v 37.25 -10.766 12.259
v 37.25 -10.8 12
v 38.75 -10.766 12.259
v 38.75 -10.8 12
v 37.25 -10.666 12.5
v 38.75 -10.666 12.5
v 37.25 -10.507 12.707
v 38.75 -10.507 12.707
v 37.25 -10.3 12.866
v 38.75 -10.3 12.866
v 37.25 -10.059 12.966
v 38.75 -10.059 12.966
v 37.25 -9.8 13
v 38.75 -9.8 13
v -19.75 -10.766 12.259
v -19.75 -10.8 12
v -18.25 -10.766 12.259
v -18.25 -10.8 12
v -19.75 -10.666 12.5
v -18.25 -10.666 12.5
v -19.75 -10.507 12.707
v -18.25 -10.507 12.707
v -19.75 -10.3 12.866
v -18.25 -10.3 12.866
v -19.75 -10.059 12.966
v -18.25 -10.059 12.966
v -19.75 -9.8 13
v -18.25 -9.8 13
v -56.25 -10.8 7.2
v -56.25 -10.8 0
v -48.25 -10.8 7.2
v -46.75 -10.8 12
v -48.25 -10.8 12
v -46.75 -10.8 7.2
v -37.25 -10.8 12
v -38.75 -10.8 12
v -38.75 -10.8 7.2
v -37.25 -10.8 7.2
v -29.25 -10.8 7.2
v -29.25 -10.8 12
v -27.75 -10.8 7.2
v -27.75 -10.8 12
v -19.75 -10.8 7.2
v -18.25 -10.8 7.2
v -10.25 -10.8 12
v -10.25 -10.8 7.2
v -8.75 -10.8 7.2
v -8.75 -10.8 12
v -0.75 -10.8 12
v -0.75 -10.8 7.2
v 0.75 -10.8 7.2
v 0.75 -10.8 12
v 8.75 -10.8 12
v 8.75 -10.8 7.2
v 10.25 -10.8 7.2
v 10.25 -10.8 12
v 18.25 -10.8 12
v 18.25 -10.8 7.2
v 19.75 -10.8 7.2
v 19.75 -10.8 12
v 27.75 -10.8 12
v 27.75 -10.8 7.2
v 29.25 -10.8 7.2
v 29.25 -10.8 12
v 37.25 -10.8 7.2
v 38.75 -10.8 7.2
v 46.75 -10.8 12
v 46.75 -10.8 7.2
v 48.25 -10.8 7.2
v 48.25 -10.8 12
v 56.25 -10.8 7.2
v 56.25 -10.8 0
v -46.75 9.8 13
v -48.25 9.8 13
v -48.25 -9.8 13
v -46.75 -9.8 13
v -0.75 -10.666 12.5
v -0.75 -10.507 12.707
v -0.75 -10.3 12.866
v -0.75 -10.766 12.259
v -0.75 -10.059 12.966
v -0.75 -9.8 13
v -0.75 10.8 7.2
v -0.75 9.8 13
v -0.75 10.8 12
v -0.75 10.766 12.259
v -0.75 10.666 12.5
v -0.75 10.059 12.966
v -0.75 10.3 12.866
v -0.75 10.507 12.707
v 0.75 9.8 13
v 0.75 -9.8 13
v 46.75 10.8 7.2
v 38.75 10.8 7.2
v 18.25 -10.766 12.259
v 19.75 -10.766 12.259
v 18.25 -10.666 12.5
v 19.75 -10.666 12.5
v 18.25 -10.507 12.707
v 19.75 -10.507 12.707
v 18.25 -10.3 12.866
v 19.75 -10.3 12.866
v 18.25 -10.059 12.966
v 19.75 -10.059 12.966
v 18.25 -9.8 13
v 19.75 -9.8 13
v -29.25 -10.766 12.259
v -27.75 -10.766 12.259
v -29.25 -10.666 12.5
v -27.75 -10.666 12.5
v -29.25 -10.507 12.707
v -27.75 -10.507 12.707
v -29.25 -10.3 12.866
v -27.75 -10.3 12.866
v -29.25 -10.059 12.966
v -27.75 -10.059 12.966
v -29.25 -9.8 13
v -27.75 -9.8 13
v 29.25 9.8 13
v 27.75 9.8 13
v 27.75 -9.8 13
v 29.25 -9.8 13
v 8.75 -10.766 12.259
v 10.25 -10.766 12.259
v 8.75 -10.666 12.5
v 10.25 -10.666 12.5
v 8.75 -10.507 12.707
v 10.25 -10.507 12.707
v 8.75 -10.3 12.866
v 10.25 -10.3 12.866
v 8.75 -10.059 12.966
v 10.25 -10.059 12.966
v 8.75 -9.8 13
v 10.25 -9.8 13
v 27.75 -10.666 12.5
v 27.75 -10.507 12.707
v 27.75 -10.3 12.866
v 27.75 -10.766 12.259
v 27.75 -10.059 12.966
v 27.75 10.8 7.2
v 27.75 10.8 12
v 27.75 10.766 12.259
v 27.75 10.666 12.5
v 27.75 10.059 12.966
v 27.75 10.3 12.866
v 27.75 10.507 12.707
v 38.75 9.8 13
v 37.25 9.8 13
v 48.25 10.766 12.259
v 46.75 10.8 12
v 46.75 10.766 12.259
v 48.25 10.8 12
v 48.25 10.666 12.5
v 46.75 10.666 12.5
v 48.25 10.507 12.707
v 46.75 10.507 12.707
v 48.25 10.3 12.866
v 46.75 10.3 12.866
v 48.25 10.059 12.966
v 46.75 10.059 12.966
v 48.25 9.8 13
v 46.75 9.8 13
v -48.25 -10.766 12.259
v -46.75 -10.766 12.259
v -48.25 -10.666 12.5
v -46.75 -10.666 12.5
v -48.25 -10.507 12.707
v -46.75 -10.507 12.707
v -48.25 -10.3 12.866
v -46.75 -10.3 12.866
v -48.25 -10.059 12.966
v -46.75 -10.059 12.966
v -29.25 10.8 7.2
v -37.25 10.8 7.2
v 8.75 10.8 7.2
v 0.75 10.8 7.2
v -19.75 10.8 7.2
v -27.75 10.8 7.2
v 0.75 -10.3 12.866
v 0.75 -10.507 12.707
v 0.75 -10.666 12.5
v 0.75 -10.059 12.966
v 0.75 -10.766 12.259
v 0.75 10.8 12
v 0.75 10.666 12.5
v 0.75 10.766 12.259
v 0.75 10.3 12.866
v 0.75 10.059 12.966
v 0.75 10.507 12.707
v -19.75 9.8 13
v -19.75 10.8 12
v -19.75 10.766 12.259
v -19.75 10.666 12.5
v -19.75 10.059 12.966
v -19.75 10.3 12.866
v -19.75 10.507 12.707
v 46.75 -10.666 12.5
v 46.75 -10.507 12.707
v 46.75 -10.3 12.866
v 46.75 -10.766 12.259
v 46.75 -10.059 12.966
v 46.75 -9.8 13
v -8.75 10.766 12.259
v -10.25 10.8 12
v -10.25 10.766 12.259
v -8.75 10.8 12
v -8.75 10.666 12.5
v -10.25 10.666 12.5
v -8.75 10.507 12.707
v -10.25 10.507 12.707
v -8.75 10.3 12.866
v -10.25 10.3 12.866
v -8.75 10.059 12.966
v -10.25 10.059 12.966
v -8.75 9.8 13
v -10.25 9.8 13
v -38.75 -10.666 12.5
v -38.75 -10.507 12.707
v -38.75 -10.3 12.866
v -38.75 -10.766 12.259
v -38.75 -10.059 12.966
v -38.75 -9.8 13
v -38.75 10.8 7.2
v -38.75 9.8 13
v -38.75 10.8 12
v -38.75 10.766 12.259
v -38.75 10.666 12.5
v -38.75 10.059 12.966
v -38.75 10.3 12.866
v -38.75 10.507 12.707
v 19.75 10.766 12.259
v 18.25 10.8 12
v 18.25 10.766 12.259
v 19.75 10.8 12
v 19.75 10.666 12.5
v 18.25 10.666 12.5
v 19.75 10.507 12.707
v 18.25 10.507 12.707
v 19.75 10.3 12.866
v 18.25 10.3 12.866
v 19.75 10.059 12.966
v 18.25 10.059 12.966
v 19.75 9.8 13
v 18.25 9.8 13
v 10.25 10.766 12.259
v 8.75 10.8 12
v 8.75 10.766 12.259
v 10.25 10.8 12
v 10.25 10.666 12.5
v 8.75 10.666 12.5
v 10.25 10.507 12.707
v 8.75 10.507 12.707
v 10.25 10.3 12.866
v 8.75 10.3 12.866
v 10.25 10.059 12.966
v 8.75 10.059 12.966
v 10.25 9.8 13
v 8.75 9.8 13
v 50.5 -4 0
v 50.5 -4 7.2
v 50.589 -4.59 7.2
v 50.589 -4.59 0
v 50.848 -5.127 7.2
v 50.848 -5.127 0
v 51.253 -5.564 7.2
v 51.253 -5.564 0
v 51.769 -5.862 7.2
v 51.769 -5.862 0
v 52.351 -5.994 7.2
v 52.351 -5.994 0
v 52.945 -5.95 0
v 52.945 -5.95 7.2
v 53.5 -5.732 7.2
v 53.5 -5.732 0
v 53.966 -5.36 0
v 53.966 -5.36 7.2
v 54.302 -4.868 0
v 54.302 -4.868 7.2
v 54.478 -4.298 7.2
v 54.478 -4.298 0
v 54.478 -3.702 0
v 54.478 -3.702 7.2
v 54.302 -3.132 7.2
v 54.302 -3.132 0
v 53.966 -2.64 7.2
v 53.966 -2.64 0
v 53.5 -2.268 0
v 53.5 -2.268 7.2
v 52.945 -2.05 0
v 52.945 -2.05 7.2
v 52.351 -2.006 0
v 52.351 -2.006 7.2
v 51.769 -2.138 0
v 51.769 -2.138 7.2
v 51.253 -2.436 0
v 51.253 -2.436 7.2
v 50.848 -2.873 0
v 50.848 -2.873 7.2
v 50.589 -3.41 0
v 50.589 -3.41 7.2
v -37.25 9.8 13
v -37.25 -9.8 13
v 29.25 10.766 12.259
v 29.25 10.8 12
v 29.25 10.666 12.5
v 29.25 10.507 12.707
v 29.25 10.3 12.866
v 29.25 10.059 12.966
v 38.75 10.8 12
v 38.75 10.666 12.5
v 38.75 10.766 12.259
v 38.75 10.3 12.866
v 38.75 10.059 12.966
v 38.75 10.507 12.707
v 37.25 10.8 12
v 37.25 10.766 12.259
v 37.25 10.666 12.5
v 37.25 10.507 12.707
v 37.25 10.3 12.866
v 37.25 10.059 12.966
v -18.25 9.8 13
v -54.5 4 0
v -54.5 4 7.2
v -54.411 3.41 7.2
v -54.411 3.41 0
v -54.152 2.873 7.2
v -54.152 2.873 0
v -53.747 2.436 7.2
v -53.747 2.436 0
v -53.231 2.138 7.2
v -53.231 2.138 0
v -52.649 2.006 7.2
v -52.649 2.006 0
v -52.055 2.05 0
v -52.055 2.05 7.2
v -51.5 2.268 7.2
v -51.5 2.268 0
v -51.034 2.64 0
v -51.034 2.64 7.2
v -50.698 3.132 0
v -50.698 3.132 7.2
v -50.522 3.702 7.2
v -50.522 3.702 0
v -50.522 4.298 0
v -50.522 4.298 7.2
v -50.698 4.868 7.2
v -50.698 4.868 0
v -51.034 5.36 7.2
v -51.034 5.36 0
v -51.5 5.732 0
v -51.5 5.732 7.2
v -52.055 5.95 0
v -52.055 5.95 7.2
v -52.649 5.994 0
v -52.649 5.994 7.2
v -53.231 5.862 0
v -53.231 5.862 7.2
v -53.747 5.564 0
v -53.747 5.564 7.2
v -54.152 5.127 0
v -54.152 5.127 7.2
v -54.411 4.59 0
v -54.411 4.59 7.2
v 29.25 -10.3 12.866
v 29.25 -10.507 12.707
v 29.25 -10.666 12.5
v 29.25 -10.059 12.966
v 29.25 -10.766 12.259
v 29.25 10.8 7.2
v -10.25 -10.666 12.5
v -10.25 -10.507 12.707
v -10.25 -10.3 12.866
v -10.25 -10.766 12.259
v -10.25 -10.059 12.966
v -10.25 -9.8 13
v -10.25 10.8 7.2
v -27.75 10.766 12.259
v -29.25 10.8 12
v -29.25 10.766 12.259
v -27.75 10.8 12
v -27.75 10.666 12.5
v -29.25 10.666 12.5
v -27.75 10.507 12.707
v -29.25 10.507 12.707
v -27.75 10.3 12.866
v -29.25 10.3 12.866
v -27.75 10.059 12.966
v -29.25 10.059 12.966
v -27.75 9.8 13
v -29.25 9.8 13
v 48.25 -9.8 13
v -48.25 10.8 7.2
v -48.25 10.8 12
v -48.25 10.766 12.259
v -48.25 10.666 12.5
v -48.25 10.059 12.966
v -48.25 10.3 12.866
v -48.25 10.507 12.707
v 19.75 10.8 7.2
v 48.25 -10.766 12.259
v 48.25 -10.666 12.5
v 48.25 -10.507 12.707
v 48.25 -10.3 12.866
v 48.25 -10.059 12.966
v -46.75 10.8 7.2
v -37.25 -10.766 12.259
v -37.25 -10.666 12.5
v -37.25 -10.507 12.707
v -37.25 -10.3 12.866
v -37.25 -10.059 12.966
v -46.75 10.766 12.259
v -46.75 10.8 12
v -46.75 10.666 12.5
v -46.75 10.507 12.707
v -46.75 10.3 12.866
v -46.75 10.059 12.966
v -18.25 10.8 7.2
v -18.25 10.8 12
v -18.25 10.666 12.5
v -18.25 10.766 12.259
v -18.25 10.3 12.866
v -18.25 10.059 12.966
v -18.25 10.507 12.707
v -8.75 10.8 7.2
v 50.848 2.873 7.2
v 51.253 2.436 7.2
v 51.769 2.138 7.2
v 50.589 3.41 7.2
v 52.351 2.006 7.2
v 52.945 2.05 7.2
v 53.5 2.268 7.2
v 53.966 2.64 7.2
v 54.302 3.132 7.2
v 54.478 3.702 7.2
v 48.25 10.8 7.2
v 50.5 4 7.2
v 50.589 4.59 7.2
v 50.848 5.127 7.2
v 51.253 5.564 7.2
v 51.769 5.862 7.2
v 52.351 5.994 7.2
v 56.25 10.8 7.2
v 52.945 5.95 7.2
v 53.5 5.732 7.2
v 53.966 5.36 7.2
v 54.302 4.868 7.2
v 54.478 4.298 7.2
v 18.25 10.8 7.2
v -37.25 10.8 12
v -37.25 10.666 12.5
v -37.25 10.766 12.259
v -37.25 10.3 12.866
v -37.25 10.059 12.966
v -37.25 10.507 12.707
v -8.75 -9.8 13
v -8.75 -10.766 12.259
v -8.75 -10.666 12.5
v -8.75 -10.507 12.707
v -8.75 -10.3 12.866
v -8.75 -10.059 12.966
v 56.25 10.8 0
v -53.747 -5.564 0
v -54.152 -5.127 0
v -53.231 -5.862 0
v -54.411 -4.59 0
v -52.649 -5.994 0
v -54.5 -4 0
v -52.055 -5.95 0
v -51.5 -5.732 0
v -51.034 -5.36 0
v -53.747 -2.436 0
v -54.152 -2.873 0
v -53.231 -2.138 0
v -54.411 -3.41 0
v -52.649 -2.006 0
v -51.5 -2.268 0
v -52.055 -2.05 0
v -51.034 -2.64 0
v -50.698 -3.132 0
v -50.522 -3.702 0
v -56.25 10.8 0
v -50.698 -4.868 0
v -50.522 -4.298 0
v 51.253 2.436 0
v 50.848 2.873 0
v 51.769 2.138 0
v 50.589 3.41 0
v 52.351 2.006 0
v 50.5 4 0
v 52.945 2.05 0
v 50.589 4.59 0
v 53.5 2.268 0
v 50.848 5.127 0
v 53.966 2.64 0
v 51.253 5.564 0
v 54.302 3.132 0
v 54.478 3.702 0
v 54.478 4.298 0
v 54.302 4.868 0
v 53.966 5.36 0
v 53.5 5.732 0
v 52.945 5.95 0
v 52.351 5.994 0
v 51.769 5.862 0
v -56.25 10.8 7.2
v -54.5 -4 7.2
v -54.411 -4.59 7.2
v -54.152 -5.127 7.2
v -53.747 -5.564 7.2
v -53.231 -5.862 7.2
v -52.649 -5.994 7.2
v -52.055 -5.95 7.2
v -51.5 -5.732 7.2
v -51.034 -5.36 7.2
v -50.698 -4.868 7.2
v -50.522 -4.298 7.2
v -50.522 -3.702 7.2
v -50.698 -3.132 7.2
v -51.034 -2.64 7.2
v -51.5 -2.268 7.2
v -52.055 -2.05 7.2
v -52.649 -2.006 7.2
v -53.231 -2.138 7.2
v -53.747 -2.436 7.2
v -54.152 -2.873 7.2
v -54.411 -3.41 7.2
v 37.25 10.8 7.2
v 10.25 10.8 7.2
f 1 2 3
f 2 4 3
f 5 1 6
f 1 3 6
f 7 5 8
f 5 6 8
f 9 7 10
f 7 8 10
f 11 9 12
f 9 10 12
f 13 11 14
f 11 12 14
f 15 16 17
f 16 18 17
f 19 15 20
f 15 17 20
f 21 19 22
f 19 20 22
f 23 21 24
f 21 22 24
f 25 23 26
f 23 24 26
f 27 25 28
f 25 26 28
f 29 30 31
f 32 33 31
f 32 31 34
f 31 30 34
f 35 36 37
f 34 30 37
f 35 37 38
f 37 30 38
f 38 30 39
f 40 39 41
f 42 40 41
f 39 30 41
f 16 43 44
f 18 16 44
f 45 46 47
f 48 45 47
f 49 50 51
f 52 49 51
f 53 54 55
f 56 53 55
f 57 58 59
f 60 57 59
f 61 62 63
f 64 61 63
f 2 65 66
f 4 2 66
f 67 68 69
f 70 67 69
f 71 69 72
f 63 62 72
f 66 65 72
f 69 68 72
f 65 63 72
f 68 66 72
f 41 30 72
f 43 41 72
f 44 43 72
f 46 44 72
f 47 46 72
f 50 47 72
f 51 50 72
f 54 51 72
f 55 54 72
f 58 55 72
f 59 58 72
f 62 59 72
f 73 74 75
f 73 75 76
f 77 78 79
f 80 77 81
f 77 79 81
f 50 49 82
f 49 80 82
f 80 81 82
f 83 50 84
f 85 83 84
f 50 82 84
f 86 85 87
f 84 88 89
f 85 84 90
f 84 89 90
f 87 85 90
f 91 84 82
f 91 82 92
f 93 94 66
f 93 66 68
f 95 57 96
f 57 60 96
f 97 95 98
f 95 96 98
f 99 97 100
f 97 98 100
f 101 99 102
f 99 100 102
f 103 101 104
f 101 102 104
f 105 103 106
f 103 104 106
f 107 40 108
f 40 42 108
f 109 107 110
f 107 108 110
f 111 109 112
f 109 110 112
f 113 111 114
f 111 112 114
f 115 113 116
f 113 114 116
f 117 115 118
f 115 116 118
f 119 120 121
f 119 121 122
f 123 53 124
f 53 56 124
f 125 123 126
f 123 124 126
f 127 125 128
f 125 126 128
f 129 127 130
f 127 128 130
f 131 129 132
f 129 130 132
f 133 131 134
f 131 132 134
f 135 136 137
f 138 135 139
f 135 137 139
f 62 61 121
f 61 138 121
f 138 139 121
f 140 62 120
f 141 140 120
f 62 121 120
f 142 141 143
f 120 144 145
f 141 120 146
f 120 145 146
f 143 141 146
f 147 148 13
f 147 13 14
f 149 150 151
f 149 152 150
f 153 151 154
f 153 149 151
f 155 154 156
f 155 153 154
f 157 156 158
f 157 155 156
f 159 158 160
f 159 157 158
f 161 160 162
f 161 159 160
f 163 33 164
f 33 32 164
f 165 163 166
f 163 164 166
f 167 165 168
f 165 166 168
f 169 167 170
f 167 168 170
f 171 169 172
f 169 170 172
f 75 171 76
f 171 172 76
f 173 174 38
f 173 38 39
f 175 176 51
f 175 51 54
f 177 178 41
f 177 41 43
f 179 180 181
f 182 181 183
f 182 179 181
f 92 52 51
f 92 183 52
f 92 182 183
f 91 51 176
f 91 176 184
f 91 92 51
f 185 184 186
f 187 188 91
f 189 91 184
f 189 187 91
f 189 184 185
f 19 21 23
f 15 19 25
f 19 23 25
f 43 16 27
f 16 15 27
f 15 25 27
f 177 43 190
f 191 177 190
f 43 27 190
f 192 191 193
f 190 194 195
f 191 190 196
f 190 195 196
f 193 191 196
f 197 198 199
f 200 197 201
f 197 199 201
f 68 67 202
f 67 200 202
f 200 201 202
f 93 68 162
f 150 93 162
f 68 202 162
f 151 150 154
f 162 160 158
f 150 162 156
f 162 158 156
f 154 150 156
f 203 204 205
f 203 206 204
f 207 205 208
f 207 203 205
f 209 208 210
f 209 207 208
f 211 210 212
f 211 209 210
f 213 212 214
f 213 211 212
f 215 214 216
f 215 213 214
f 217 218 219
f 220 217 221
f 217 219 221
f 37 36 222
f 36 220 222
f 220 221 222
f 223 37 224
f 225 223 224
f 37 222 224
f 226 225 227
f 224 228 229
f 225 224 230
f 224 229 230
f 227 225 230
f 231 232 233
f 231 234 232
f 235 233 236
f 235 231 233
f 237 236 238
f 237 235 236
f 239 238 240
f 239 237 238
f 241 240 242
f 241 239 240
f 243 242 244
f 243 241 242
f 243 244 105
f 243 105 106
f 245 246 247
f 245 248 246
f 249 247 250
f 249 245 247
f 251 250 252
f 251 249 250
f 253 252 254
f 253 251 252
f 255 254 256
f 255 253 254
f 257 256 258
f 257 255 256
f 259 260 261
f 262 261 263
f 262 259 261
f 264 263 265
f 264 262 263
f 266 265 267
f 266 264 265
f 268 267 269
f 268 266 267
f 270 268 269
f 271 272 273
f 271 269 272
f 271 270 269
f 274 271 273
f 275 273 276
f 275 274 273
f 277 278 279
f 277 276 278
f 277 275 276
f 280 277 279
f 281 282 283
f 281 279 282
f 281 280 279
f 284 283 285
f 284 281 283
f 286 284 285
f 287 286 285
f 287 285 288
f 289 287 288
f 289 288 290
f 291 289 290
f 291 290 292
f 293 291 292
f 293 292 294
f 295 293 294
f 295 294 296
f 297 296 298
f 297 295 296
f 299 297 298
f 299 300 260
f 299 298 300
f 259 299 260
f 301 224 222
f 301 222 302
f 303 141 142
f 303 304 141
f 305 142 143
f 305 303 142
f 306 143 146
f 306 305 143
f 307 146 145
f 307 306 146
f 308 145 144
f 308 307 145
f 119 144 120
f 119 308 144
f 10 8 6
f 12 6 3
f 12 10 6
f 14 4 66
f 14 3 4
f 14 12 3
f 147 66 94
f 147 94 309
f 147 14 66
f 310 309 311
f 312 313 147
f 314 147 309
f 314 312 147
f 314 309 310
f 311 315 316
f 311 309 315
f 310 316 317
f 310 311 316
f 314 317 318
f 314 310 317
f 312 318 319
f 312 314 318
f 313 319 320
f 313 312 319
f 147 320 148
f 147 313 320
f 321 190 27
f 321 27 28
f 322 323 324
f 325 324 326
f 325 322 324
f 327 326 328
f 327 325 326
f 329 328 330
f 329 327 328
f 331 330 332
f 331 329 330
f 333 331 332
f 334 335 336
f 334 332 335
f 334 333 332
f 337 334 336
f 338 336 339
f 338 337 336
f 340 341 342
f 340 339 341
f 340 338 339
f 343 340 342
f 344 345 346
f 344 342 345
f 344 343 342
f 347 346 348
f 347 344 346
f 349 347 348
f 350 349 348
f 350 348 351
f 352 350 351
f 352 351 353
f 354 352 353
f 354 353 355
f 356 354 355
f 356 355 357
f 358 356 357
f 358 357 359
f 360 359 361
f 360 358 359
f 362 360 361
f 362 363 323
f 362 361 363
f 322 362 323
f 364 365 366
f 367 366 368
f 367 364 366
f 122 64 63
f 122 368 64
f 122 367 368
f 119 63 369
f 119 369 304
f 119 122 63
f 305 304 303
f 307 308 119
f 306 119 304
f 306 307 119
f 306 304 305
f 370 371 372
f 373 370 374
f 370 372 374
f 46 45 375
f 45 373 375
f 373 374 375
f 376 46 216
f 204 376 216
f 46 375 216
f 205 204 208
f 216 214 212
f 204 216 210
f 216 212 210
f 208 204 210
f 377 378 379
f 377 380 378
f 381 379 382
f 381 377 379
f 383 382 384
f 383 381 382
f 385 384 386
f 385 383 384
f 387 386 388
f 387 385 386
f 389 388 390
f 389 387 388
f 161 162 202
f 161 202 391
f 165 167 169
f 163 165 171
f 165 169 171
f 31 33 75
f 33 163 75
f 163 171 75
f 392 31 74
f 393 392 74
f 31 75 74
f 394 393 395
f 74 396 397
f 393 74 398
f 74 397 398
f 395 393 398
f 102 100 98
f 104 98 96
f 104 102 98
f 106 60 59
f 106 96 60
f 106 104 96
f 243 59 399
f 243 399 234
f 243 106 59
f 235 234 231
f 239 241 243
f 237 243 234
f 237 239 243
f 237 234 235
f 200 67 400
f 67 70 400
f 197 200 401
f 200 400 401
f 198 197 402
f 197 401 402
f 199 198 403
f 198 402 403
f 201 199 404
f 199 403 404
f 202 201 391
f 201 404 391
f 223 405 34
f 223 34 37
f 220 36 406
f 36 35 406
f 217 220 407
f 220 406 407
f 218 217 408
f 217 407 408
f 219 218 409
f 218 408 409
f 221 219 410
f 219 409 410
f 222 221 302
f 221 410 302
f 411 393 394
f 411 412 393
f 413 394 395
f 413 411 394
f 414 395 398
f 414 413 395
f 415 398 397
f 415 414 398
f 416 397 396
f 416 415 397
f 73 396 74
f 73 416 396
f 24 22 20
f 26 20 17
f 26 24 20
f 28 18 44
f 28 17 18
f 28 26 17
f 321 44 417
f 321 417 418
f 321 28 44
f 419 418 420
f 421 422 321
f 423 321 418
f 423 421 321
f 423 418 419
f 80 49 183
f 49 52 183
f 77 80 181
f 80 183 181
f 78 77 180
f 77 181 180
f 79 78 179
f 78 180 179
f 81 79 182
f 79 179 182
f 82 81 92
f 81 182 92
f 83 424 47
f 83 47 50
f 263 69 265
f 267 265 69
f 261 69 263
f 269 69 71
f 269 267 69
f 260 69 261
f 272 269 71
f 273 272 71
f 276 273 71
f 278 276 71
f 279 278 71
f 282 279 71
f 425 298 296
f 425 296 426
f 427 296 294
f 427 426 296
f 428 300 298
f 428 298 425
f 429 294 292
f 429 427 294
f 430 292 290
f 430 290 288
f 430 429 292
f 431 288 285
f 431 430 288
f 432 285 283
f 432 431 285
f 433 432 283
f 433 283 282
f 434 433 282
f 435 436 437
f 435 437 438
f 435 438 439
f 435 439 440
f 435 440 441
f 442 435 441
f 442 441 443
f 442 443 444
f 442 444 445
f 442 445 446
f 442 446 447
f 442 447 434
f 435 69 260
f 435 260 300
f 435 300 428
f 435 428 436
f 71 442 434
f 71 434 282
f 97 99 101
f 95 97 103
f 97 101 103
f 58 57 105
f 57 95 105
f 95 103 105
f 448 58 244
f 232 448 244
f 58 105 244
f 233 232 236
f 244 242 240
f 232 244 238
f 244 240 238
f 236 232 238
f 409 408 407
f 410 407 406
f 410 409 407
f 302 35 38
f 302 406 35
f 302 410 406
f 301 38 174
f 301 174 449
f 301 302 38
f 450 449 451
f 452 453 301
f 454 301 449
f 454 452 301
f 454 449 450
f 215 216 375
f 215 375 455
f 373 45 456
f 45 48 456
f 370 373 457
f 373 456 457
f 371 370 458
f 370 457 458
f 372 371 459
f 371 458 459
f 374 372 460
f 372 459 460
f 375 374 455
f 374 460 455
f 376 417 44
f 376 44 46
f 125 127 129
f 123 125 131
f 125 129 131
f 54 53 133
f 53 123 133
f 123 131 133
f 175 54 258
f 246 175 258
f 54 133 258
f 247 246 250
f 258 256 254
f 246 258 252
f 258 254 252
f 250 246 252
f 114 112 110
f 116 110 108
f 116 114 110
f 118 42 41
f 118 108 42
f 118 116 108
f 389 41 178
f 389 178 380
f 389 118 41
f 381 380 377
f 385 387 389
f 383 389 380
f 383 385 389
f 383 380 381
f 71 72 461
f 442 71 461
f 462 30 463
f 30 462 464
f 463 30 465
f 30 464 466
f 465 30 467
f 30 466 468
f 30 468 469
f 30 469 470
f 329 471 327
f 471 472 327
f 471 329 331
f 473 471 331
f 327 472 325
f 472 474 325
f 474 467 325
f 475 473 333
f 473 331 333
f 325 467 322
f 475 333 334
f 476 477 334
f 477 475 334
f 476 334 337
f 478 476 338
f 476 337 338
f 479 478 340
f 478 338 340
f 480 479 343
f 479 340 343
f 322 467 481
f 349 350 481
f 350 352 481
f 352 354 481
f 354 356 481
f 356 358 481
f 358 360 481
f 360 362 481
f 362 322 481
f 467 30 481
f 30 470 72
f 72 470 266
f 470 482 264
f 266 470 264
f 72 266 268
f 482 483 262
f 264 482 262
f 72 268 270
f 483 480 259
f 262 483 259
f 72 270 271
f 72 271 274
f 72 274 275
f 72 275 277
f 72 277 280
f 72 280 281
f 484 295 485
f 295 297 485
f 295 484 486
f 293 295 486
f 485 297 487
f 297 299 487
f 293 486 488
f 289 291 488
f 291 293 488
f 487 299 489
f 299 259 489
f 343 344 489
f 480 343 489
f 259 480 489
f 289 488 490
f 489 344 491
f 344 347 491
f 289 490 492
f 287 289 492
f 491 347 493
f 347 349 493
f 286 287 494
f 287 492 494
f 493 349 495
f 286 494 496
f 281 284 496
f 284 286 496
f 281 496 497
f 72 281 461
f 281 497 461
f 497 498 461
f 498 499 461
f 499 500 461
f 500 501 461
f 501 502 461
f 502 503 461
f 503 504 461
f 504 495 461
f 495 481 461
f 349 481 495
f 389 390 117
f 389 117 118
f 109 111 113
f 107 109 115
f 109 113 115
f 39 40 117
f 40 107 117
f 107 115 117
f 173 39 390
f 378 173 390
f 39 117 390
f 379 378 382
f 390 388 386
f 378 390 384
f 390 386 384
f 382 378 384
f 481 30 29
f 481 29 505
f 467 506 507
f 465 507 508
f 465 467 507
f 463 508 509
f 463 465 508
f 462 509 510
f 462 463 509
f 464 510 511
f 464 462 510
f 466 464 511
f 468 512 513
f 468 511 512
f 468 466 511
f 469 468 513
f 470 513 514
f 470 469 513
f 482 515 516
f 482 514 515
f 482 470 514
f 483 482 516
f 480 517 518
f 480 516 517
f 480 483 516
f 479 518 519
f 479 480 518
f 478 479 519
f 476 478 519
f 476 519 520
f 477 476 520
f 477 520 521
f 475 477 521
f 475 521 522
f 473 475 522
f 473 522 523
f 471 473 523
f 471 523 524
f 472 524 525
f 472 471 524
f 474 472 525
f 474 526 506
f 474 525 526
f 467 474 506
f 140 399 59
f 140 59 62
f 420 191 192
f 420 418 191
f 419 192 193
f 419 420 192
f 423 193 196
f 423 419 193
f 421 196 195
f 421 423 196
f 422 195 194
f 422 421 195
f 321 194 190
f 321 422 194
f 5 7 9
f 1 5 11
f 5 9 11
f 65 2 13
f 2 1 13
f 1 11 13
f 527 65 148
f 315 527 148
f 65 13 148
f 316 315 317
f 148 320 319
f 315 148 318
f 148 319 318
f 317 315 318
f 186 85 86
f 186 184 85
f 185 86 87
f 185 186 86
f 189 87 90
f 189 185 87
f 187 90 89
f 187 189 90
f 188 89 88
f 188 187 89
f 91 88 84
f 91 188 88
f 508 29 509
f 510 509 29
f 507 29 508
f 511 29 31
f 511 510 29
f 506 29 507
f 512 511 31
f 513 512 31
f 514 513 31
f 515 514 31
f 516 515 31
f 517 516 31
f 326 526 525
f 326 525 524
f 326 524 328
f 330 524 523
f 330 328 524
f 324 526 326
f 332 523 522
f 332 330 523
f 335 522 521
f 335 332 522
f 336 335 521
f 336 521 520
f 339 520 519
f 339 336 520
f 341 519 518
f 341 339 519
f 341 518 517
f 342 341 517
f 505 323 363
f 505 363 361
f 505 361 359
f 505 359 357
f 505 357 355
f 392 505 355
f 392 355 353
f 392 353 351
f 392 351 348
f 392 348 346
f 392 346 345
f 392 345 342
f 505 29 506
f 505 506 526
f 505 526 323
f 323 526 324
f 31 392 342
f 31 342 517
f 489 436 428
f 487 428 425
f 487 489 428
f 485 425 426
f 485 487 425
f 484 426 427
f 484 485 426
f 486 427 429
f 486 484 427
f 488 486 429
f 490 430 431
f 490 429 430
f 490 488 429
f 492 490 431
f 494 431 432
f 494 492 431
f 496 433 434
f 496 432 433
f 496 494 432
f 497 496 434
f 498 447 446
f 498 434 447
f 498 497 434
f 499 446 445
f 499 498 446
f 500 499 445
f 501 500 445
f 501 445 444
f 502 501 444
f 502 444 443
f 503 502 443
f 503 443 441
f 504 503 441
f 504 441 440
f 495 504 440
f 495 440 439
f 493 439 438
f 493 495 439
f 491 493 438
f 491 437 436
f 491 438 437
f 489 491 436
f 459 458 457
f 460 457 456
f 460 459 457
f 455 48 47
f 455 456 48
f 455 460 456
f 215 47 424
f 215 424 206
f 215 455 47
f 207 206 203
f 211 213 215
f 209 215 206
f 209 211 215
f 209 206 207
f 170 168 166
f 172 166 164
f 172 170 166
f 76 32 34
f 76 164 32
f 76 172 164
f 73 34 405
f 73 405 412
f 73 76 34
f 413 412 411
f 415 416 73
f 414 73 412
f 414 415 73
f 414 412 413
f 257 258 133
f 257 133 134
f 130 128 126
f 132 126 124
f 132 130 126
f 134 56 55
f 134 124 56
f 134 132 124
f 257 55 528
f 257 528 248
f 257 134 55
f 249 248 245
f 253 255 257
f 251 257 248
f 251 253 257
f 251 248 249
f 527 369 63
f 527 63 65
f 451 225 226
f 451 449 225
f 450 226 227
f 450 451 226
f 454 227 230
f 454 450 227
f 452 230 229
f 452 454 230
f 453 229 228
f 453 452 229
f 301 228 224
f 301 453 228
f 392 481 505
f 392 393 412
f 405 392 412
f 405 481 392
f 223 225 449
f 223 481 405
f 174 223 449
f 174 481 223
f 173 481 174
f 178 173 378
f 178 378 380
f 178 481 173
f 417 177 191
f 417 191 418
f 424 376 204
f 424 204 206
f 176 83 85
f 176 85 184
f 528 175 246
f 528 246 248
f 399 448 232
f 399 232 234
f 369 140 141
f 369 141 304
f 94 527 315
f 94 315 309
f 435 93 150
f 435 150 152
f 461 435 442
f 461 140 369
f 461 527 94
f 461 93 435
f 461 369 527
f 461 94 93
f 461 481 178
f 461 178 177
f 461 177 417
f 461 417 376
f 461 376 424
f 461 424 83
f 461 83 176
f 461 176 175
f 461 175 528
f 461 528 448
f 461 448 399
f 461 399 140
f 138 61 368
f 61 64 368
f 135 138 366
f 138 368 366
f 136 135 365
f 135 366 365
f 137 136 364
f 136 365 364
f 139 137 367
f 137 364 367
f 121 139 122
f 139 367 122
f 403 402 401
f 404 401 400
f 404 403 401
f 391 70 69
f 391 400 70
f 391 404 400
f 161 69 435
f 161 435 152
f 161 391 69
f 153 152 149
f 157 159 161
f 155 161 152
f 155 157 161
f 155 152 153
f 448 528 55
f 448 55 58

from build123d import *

# Parameters (mm, degrees)
SKETCH1_W           = 112.5
SKETCH1_H           = 21.6
SKETCH1_R           = 2
BOSS_EXTRUDE1_DEPTH = 13
SKETCH2_W           = 8
SKETCH2_H           = 21.6
CUT_EXTRUDE1_DEPTH  = 5.8
FILLET1_R           = 1


with BuildPart() as part:
    # Sketch1 → Boss-Extrude1 (new body)
    with BuildSketch(Plane.XY):
        Rectangle(SKETCH1_W, SKETCH1_H)
        with Locations(Location((-52.5, 4, 0), (0, 0, 180))):
            Circle(SKETCH1_R, mode=Mode.SUBTRACT)
        with Locations(Location((52.5, 4, 0), (0, 0, 180))):
            Circle(SKETCH1_R, mode=Mode.SUBTRACT)
        with Locations(Location((52.5, -4, 0), (0, 0, 180))):
            Circle(SKETCH1_R, mode=Mode.SUBTRACT)
        with Locations(Location((-52.5, -4, 0), (0, 0, 180))):
            Circle(SKETCH1_R, mode=Mode.SUBTRACT)
    extrude(amount=BOSS_EXTRUDE1_DEPTH)

    # Sketch2 → Cut-Extrude1 (cut)
    with BuildSketch(Plane.XY.offset(13)):
        with Locations((-42.75, 0)):
            Rectangle(SKETCH2_W, SKETCH2_H)
        with Locations((-52.25, 0)):
            Rectangle(SKETCH2_W, SKETCH2_H)
        with Locations((-33.25, 0)):
            Rectangle(SKETCH2_W, SKETCH2_H)
        with Locations((-23.75, 0)):
            Rectangle(SKETCH2_W, SKETCH2_H)
        with Locations((-14.25, 0)):
            Rectangle(SKETCH2_W, SKETCH2_H)
        with Locations((-4.75, 0)):
            Rectangle(SKETCH2_W, SKETCH2_H)
        with Locations((4.75, 0)):
            Rectangle(SKETCH2_W, SKETCH2_H)
        with Locations((14.25, 0)):
            Rectangle(SKETCH2_W, SKETCH2_H)
        with Locations((23.75, 0)):
            Rectangle(SKETCH2_W, SKETCH2_H)
        with Locations((33.25, 0)):
            Rectangle(SKETCH2_W, SKETCH2_H)
        with Locations((42.75, 0)):
            Rectangle(SKETCH2_W, SKETCH2_H)
        with Locations((52.25, 0)):
            Rectangle(SKETCH2_W, SKETCH2_H)
    extrude(amount=-CUT_EXTRUDE1_DEPTH, mode=Mode.SUBTRACT)

    # Fillet1
    fillet1_edges = [part.edges().sort_by_distance(p)[0] for p in [
        (47.5, 10.8, 13),
        (38, 10.8, 13),
        (28.5, 10.8, 13),
        (19, 10.8, 13),
        (9.5, 10.8, 13),
        (0, 10.8, 13),
        (-9.5, 10.8, 13),
        (-19, 10.8, 13),
        (-28.5, 10.8, 13),
        (-38, 10.8, 13),
        (-47.5, 10.8, 13),
        (-47.5, -10.8, 13),
        (-38, -10.8, 13),
        (-28.5, -10.8, 13),
        (-19, -10.8, 13),
        (-9.5, -10.8, 13),
        (0, -10.8, 13),
        (9.5, -10.8, 13),
        (19, -10.8, 13),
        (28.5, -10.8, 13),
        (38, -10.8, 13),
        (47.5, -10.8, 13),
    ]]
    fillet(fillet1_edges, radius=FILLET1_R)


solid = part.part
